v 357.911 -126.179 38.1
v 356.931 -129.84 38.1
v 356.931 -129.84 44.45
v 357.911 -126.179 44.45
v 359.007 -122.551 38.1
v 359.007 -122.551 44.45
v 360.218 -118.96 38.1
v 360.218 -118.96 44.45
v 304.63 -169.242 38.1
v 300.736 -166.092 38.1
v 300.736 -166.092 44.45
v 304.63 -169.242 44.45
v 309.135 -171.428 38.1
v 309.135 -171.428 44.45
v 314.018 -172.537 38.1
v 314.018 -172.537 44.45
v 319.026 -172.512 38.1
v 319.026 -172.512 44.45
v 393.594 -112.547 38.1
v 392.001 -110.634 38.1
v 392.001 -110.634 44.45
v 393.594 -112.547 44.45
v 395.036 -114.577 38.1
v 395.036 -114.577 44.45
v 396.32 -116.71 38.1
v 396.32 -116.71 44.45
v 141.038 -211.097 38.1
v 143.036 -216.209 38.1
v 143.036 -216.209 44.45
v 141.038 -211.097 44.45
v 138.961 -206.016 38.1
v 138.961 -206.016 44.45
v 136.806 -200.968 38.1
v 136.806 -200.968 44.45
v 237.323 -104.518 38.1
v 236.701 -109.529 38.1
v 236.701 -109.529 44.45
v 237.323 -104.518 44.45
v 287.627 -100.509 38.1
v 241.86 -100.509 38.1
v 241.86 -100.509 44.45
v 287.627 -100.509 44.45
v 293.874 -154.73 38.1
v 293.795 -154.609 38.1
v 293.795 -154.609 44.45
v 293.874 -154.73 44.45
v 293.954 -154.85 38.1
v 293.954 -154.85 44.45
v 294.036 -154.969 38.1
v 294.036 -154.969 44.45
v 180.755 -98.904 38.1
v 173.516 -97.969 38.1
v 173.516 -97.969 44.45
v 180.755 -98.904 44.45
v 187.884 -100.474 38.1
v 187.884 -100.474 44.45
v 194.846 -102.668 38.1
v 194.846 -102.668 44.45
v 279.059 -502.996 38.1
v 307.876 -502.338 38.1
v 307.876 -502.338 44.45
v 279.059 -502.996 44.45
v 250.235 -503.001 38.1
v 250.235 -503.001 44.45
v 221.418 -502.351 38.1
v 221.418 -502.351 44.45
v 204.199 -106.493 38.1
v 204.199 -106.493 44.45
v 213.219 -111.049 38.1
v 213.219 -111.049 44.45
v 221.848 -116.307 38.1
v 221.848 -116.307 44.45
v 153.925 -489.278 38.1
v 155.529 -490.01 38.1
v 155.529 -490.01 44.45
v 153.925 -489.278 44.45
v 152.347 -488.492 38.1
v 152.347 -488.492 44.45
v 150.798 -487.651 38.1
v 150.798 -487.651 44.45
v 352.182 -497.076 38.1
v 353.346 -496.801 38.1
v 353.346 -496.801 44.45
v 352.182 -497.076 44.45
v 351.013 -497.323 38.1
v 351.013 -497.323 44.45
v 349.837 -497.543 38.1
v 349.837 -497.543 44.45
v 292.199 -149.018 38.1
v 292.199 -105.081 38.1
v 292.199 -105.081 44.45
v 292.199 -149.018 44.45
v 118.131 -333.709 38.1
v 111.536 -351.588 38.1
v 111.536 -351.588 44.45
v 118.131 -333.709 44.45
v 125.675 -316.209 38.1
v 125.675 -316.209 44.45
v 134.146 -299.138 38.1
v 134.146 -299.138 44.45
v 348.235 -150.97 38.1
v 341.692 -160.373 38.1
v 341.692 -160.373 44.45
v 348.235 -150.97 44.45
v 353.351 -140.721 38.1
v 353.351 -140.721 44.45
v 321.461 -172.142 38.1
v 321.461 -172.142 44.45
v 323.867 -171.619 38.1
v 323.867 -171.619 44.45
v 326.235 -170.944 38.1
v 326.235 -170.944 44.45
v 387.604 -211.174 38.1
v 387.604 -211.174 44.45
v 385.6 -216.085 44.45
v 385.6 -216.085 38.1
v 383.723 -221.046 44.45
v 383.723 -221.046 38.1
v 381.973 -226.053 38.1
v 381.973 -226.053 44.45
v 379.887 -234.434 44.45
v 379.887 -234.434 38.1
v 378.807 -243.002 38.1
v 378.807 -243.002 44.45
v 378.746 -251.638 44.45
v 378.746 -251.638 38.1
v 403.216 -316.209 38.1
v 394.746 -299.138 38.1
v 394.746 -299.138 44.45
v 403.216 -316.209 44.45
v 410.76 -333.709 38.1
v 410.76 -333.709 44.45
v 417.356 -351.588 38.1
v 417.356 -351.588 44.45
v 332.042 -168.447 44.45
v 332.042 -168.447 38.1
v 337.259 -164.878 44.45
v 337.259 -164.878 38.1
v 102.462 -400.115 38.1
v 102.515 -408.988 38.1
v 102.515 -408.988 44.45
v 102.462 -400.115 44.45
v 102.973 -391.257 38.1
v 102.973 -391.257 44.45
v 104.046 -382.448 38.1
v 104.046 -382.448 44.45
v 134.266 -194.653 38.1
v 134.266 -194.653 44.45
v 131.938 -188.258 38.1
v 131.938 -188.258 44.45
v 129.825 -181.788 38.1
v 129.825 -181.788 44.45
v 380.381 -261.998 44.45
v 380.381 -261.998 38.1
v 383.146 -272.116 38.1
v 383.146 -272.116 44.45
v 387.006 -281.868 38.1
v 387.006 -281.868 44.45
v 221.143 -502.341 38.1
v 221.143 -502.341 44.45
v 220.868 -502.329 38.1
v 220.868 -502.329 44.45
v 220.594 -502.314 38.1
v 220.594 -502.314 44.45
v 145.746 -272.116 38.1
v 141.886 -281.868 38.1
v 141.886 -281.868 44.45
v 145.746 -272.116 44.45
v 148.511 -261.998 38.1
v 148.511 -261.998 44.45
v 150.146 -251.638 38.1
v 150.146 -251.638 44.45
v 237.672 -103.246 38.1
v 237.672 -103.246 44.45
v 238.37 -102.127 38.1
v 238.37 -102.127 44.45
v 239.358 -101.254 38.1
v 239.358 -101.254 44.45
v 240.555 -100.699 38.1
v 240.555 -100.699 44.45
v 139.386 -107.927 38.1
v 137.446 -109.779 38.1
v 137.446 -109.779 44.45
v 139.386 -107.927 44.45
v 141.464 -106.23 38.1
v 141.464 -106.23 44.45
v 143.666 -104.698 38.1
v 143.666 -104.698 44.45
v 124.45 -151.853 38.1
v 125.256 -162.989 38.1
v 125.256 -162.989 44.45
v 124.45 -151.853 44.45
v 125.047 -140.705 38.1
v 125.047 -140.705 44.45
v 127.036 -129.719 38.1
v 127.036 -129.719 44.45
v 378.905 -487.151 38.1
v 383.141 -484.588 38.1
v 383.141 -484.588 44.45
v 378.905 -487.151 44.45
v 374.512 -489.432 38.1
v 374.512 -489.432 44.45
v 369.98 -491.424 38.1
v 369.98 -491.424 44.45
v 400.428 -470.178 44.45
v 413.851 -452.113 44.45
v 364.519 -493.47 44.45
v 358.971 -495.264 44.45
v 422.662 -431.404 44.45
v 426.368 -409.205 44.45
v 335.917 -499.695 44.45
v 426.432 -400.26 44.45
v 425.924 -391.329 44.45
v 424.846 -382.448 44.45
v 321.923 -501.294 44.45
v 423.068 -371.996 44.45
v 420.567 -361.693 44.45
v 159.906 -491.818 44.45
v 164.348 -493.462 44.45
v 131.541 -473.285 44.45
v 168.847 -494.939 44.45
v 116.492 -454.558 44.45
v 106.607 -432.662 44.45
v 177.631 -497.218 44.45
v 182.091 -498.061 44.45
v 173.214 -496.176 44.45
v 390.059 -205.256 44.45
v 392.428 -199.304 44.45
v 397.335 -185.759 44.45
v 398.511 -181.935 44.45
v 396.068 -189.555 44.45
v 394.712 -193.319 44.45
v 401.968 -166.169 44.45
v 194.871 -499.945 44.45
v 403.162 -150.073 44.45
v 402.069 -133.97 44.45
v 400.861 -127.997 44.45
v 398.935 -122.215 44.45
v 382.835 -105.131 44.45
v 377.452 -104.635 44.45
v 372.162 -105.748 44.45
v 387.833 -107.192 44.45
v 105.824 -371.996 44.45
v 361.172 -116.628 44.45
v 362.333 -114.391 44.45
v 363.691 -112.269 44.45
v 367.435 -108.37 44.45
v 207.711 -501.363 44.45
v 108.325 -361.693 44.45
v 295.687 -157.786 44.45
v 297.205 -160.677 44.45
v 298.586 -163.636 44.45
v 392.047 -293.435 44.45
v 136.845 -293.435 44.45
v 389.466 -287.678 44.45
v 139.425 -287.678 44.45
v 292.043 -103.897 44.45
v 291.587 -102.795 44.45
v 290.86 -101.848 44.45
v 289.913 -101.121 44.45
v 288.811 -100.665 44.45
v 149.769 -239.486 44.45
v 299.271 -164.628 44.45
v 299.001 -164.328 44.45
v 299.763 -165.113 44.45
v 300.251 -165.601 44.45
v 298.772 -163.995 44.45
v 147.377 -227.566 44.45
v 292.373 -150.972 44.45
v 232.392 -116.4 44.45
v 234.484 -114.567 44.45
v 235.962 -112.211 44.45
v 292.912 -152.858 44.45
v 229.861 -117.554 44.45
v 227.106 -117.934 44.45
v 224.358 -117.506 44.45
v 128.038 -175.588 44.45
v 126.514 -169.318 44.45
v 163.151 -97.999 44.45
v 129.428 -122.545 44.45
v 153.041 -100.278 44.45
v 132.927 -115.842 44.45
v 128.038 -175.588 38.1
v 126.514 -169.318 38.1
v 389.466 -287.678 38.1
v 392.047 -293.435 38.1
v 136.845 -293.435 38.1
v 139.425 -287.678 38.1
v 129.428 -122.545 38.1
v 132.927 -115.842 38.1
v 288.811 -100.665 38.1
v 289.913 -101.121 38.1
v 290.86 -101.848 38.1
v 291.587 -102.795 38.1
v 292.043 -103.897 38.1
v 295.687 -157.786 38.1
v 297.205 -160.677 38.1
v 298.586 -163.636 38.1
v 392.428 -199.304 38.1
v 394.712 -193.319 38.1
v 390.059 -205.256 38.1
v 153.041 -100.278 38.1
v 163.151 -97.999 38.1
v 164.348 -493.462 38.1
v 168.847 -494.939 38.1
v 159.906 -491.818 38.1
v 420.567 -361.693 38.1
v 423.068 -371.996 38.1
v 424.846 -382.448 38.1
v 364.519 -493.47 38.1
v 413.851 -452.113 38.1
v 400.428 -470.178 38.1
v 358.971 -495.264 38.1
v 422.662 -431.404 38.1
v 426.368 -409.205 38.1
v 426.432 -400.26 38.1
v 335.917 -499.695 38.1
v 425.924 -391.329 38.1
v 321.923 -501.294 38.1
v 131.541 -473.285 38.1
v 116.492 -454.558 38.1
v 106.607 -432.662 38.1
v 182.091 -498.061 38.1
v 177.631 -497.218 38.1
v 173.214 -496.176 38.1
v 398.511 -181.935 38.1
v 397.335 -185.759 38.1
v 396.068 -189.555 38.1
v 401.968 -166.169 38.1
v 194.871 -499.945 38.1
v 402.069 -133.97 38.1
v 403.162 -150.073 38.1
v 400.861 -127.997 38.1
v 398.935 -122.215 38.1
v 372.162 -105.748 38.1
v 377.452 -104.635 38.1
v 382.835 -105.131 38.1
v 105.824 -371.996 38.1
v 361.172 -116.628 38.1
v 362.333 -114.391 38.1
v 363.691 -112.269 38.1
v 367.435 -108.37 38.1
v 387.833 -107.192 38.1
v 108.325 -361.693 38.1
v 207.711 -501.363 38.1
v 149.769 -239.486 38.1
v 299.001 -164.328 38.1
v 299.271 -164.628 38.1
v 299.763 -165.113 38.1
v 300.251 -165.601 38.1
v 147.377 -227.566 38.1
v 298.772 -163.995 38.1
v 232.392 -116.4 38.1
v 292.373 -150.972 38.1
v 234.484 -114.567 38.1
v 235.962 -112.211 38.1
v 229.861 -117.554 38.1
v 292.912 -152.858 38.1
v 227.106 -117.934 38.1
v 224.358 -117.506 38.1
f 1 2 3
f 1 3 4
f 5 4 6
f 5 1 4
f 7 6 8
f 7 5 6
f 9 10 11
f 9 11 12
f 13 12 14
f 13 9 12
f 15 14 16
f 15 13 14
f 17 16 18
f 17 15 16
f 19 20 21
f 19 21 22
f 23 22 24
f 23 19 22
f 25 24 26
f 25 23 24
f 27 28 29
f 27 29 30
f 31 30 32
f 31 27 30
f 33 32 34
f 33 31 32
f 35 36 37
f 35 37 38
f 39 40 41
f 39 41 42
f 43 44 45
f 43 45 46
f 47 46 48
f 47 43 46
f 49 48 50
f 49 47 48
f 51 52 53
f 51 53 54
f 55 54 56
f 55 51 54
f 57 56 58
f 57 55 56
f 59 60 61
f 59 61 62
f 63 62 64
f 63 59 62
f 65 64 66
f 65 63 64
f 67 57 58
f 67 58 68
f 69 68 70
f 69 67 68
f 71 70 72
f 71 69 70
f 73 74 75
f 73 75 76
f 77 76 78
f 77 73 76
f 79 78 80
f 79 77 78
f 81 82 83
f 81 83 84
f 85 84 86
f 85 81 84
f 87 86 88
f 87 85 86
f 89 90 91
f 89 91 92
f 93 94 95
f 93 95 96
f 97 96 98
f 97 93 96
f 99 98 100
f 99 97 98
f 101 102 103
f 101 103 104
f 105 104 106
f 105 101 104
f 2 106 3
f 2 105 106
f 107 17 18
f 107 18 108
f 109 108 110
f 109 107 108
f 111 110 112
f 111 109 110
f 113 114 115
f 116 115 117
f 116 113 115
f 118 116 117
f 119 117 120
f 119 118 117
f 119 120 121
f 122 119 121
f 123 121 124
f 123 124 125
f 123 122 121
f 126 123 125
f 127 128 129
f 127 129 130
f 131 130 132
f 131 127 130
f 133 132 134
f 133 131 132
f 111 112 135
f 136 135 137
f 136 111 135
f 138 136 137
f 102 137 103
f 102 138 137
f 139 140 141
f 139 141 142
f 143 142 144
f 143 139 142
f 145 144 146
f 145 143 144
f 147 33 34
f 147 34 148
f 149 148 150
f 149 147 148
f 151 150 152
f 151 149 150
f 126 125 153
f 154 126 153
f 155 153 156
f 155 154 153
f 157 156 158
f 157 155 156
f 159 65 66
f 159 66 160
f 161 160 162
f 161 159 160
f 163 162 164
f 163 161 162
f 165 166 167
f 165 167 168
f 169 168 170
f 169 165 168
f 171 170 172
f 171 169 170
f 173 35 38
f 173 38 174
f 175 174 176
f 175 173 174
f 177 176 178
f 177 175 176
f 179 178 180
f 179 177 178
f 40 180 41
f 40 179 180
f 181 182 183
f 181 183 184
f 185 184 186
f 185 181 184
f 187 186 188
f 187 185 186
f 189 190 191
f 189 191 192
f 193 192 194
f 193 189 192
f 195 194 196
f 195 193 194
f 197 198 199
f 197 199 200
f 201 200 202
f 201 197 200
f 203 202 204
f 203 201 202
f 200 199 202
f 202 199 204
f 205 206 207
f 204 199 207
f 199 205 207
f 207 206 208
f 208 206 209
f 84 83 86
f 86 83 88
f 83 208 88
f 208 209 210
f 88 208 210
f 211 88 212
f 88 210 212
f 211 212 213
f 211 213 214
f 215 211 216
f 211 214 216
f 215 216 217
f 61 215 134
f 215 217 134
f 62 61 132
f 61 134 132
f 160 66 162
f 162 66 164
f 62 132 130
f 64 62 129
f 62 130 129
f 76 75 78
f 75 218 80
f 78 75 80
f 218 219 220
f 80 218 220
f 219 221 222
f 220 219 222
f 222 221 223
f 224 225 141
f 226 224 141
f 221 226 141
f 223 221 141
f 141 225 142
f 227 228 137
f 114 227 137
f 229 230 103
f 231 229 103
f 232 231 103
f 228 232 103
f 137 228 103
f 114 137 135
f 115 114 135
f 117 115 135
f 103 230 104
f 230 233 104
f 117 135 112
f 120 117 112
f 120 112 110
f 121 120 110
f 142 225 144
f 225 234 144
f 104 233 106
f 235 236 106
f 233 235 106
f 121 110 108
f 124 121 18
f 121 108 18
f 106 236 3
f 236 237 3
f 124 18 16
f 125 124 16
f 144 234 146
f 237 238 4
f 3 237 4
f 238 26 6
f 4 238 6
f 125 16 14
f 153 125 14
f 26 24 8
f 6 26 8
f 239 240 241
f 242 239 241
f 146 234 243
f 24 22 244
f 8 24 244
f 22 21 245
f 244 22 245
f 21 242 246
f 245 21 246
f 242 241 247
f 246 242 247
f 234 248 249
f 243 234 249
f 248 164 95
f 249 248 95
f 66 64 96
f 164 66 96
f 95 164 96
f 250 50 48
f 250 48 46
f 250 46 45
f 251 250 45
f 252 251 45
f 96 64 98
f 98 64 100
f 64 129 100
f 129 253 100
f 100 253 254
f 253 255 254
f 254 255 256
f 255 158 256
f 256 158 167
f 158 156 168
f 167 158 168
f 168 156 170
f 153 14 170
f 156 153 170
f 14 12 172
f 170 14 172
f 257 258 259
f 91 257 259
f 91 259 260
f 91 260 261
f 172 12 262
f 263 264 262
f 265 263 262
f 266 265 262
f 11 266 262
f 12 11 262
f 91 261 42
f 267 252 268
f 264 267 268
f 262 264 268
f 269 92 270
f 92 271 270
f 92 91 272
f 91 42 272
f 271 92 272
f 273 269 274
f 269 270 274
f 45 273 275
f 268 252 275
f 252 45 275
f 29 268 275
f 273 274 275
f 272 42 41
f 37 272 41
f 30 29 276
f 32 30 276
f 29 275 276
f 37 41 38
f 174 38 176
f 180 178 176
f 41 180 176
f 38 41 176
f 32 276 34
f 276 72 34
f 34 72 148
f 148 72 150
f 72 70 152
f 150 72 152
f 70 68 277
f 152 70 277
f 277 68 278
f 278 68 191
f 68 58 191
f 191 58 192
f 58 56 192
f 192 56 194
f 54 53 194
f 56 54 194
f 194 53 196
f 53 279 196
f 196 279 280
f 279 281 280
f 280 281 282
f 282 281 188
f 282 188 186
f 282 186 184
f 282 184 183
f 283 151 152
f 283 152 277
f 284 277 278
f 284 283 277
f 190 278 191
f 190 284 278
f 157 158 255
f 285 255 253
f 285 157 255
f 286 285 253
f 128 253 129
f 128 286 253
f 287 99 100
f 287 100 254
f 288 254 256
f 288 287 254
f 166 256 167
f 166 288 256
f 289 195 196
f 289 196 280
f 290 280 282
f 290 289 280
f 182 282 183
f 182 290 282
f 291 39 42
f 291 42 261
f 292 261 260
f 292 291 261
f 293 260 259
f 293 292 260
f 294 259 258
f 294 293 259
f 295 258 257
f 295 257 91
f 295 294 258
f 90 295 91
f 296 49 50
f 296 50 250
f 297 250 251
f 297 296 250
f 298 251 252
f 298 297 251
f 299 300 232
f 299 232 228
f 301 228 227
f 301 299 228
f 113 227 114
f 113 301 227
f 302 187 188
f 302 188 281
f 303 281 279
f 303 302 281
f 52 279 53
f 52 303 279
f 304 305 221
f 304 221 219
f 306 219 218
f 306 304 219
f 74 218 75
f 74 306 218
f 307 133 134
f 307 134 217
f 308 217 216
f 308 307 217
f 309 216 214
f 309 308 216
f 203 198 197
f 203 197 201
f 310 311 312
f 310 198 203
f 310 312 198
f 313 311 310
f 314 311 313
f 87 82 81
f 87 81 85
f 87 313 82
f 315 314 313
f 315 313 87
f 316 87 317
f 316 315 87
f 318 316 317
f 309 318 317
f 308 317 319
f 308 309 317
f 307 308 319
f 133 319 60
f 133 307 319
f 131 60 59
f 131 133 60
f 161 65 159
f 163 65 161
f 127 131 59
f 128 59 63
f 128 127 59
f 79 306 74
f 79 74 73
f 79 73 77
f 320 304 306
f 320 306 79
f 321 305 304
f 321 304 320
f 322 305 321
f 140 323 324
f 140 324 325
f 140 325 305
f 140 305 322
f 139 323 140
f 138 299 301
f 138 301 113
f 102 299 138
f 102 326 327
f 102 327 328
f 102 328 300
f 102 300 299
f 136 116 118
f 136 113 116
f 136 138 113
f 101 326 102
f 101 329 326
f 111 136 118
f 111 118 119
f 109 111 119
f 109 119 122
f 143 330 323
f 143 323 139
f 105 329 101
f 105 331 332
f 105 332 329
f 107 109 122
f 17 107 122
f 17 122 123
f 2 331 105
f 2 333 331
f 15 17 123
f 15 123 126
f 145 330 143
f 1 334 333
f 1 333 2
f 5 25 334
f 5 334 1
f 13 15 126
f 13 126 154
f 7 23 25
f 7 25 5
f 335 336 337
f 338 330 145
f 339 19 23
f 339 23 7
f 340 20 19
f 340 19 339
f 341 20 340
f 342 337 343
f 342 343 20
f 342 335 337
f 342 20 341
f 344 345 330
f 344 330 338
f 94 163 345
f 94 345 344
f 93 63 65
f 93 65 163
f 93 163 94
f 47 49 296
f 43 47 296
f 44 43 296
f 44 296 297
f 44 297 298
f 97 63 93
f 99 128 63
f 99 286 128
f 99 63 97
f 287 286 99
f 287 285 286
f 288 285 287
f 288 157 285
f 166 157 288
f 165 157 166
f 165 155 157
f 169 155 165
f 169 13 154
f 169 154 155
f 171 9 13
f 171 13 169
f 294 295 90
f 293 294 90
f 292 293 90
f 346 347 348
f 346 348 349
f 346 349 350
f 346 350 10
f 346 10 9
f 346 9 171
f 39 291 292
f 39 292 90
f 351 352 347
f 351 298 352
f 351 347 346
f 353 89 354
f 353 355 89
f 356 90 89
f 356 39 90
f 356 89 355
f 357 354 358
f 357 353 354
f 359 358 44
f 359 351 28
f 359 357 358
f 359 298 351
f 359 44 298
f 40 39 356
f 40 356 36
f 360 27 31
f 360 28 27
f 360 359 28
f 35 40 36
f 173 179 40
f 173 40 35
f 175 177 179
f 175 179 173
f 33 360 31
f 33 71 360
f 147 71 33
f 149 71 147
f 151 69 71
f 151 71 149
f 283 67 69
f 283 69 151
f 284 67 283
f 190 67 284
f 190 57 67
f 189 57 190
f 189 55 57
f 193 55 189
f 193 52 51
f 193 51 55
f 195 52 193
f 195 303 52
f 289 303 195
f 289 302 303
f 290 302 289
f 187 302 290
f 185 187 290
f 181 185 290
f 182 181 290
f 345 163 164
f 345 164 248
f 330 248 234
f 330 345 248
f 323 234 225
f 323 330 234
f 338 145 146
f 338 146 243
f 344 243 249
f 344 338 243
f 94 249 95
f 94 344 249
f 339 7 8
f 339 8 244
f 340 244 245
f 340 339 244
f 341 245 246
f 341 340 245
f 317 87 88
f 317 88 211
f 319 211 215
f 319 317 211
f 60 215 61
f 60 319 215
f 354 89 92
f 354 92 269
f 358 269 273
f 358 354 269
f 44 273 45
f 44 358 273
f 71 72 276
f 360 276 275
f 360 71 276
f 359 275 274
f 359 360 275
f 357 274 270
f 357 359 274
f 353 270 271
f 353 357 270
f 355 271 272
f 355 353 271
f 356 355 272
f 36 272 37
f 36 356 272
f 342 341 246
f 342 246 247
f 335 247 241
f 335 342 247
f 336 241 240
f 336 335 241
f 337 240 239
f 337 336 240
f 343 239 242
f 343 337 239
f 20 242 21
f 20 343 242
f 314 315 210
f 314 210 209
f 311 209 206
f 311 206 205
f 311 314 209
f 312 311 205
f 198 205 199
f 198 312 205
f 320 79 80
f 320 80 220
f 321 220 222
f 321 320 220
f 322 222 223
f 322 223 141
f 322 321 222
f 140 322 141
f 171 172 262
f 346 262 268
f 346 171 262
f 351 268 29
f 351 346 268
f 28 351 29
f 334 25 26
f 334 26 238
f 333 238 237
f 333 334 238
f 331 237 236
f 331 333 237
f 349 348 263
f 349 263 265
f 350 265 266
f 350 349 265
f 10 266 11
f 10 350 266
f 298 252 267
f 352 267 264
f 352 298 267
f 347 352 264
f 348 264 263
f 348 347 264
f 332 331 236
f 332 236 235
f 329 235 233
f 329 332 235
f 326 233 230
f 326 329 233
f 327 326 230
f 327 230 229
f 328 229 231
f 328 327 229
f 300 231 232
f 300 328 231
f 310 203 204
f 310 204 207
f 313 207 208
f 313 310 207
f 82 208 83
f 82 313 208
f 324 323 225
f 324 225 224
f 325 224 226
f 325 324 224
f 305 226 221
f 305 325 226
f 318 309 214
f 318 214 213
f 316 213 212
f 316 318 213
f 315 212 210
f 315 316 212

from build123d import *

# Parameters (mm, degrees)
EXTRUDE1_DEPTH     = 44.45
SKETCH8_W          = 820.295635457
SKETCH8_H          = 609.826953774
CUT_EXTRUDE1_DEPTH = 38.1


with BuildPart() as part:
    # Sketch2 → Extrude1 (new body)
    with BuildSketch(Plane.XY):
        with BuildLine():
            Line((236.701314765, -109.52926958), (237.322551245, -104.518285004))
            ThreePointArc((237.322551245, -104.518285004), (238.832324595, -101.654790046), (241.859816, -100.5087906))
            Line((241.859816, -100.5087906), (287.627187, -100.5087906))
            ThreePointArc((287.627187, -100.5087906), (290.860079204, -101.847898396), (292.199187, -105.0807906))
            Line((292.199187, -105.0807906), (292.199187, -149.0184218))
            ThreePointArc((292.199187, -149.0184218), (292.597958053, -151.927621282), (293.795193618, -154.608868562))
            ThreePointArc((293.795193618, -154.608868562), (293.913773723, -154.790051229), (294.036001367, -154.968793512))
            ThreePointArc((294.036001367, -154.968793512), (296.462850079, -159.222895043), (298.58610753, -163.636368995))
            ThreePointArc((298.58610753, -163.636368995), (298.881112709, -164.165143005), (299.271135507, -164.628297651))
            ThreePointArc((299.271135507, -164.628297651), (300.007264707, -165.356749106), (300.73644663, -166.092154739))
            ThreePointArc((300.73644663, -166.092154739), (309.134939866, -171.428010927), (319.025875401, -172.512189948))
            ThreePointArc((319.025875401, -172.512189948), (322.667874381, -171.899747758), (326.235195219, -170.94399463))
            ThreePointArc((326.235195219, -170.94399463), (334.736991182, -166.788776714), (341.69241097, -160.372507853))
            ThreePointArc((341.69241097, -160.372507853), (350.978860141, -145.938116384), (356.931481894, -129.839790708))
            ThreePointArc((356.931481894, -129.839790708), (358.444492908, -124.360678247), (360.217684146, -118.960153409))
            ThreePointArc((360.217684146, -118.960153409), (361.726955491, -115.496522091), (363.691265694, -112.269119525))
            ThreePointArc((363.691265694, -112.269119525), (377.452236791, -104.634981944), (392.000789341, -110.63364853))
            ThreePointArc((392.000789341, -110.63364853), (394.334174265, -113.548333419), (396.320318679, -116.709868421))
            ThreePointArc((396.320318679, -116.709868421), (399.985801408, -125.076496738), (402.069054575, -133.970106202))
            ThreePointArc((402.069054575, -133.970106202), (402.850473596, -158.142444635), (398.510836922, -181.934882814))
            ThreePointArc((398.510836922, -181.934882814), (396.712752953, -187.660630305), (394.711731045, -193.318651304))
            ThreePointArc((394.711731045, -193.318651304), (391.254221541, -202.284530505), (387.604313736, -211.173823775))
            ThreePointArc((387.604313736, -211.173823775), (384.645418623, -218.559200445), (381.97307243, -226.053025547))
            ThreePointArc((381.97307243, -226.053025547), (379.220115758, -238.701804496), (378.745605361, -251.638002516))
            ThreePointArc((378.745605361, -251.638002516), (381.624241727, -267.094911335), (387.005590994, -281.867983379))
            ThreePointArc((387.005590994, -281.867983379), (390.741696955, -290.562895178), (394.746018404, -299.137589848))
            ThreePointArc((394.746018404, -299.137589848), (407.105387056, -324.908404556), (417.355590006, -351.588401252))
            ThreePointArc((417.355590006, -351.588401252), (421.906718125, -366.822834456), (424.846419648, -382.448418515))
            ThreePointArc((424.846419648, -382.448418515), (426.249850723, -395.79034395), (426.367663828, -409.205362144))
            ThreePointArc((426.367663828, -409.205362144), (413.851256788, -452.11341389), (383.140740026, -484.58841212))
            ThreePointArc((383.140740026, -484.58841212), (376.726903694, -488.327090669), (369.979691238, -491.423885444))
            ThreePointArc((369.979691238, -491.423885444), (361.755548517, -494.399048058), (353.346112162, -496.801025635))
            ThreePointArc((353.346112162, -496.801025635), (351.598275163, -497.203126282), (349.837333504, -497.543278577))
            ThreePointArc((349.837333504, -497.543278577), (328.927692137, -500.563756073), (307.875617353, -502.337603226))
            ThreePointArc((307.875617353, -502.337603226), (264.647049723, -503.080365686), (221.41824861, -502.351318606))
            ThreePointArc((221.41824861, -502.351318606), (221.00580821, -502.335100706), (220.593567708, -502.314415619))
            ThreePointArc((220.593567708, -502.314415619), (201.284363819, -500.712124888), (182.091052494, -498.06080619))
            ThreePointArc((182.091052494, -498.06080619), (175.416754512, -496.721648206), (168.847112314, -494.938561263))
            ThreePointArc((168.847112314, -494.938561263), (162.119330737, -492.66041844), (155.529409804, -490.009772905))
            ThreePointArc((155.529409804, -490.009772905), (153.132812394, -488.891967619), (150.797631292, -487.650961163))
            ThreePointArc((150.797631292, -487.650961163), (116.491995751, -454.558228352), (102.514776867, -408.988030339))
            ThreePointArc((102.514776867, -408.988030339), (102.647448667, -395.681700976), (104.046018753, -382.448409448))
            ThreePointArc((104.046018753, -382.448409448), (106.98510575, -366.822864688), (111.535598588, -351.588400588))
            ThreePointArc((111.535598588, -351.588400588), (121.785921274, -324.908172846), (134.146411655, -299.137609307))
            ThreePointArc((134.146411655, -299.137609307), (138.150111982, -290.562902597), (141.885599861, -281.867999389))
            ThreePointArc((141.885599861, -281.867999389), (147.267652973, -267.095112393), (150.145582523, -251.638003757))
            ThreePointArc((150.145582523, -251.638003757), (148.821670426, -233.475790137), (143.036402463, -216.208786303))
            ThreePointArc((143.036402463, -216.208786303), (140.009349985, -208.5521602), (136.805998568, -200.967602883))
            ThreePointArc((136.805998568, -200.967602883), (133.075014503, -191.465363775), (129.82521382, -181.787988837))
            ThreePointArc((129.82521382, -181.787988837), (127.242537041, -172.460798588), (125.255618654, -162.988794966))
            ThreePointArc((125.255618654, -162.988794966), (124.573431659, -146.269657735), (127.035980496, -129.718803313))
            ThreePointArc((127.035980496, -129.718803313), (131.043720455, -119.123881134), (137.44559748, -109.77881152))
            ThreePointArc((137.44559748, -109.77881152), (140.408836969, -107.058482812), (143.665986338, -104.697984023))
            ThreePointArc((143.665986338, -104.697984023), (158.033642326, -98.861944673), (173.515606109, -97.968809036))
            ThreePointArc((173.515606109, -97.968809036), (184.337065562, -99.609972723), (194.84638863, -102.668000127))
            ThreePointArc((194.84638863, -102.668000127), (208.754429598, -108.681110615), (221.847962027, -116.306758775))
            ThreePointArc((221.847962027, -116.306758775), (231.168773326, -117.069146469), (236.701314765, -109.52926958))
        make_face()
    extrude(amount=EXTRUDE1_DEPTH)

    # Sketch8 → Cut-Extrude1 (cut)
    with BuildSketch(Plane(origin=(0, 0, 0), x_dir=(-1, 0, 0), z_dir=(0, 0, -1))):
        with Locations((-256.741670113, -315.378342919)):
            Rectangle(SKETCH8_W, SKETCH8_H)
    extrude(amount=-CUT_EXTRUDE1_DEPTH, mode=Mode.SUBTRACT)


solid = part.part
